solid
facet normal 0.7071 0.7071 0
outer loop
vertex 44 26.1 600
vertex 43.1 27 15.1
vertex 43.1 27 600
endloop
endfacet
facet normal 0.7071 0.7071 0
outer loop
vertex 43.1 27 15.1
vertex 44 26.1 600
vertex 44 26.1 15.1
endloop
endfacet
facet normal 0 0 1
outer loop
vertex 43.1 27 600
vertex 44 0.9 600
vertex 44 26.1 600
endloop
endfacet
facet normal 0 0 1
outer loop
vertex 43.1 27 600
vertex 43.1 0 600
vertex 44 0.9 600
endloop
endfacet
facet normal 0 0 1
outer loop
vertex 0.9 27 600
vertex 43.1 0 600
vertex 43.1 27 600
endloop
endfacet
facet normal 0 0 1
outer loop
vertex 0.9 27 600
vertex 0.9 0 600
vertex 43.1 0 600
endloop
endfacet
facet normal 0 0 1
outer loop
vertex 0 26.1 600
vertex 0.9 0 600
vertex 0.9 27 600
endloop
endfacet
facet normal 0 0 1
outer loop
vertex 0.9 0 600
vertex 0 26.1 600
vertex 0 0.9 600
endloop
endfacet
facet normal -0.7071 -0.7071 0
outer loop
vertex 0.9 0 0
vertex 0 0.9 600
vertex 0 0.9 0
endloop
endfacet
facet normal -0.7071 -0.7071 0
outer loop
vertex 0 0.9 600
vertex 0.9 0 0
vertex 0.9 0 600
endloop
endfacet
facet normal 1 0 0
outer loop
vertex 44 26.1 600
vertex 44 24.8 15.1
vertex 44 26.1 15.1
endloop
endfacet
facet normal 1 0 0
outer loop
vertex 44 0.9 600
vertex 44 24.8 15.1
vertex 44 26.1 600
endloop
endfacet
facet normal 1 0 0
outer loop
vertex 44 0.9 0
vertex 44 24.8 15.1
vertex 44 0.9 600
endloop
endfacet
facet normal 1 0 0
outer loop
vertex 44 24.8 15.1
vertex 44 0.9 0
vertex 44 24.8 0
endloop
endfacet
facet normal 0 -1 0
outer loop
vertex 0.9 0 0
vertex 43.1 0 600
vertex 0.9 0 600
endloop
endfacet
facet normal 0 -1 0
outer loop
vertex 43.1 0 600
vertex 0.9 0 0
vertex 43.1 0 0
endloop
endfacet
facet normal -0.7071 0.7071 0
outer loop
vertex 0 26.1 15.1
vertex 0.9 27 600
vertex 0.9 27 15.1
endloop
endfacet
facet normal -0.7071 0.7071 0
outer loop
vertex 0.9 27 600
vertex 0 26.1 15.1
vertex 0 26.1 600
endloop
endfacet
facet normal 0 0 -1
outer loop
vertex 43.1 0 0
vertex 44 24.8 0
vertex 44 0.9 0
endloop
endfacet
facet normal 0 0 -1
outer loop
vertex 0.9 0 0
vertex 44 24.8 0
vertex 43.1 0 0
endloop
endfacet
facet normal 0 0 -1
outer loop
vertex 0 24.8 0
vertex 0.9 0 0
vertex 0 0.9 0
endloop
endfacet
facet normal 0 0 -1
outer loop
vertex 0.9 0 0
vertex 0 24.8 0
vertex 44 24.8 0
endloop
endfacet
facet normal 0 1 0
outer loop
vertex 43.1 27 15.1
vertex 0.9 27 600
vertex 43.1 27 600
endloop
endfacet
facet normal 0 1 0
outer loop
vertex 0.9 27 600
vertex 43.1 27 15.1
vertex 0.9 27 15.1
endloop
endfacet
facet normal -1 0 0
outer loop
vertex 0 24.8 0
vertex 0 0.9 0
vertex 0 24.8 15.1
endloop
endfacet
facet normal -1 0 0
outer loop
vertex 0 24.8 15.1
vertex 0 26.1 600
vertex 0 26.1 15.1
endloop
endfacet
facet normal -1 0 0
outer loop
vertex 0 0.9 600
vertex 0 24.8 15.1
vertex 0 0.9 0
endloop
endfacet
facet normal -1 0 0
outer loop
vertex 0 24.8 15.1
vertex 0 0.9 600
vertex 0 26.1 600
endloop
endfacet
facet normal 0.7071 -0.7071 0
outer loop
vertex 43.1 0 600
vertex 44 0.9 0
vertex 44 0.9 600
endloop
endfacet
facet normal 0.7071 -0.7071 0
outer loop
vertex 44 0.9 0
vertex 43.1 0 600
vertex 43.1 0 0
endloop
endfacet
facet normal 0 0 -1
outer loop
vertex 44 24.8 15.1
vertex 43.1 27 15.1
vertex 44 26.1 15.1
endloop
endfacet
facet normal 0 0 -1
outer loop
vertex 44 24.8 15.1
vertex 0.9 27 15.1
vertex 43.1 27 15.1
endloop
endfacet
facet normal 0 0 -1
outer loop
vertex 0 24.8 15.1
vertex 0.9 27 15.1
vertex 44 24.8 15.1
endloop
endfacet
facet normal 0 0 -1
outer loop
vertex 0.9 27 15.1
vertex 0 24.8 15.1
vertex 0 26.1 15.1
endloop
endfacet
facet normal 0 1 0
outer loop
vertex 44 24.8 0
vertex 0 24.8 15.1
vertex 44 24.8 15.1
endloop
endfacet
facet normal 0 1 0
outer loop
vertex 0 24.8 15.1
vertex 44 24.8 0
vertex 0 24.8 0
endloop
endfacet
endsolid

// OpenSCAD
// file: wood_beam.scad
// Generic wooden member helpers.
// Open this file directly in OpenSCAD to tune and render a simple beam.

/* [Standalone preview] */
beam_width = 18;
beam_depth = 75;
beam_height = 300;
beam_edge_radius = 0.9;

// Wooden members get a very small visual corner radius. The radius is
// deliberately subtle: it helps separate adjoining parts in preview without
// materially changing the nominal dimensions used for the design.
module wood_beam(width, depth, height, radius = 0.9) {
    r = min(radius, min(width, depth) / 4);
    if (r <= 0)
        cube([width, depth, height]);
    else
        linear_extrude(height = height)
            offset(r = r)
                offset(delta = -r)
                    square([width, depth]);
}

// Extrude a 2D polygon drawn in the Y/Z plane through X.
module wood_prism_yz(width, points, radius = 0.9) {
    multmatrix([
        [0, 0, 1, 0],
        [1, 0, 0, 0],
        [0, 1, 0, 0],
        [0, 0, 0, 1]
    ])
        linear_extrude(height = width)
            if (radius > 0)
                offset(r = radius)
                    offset(delta = -radius)
                        polygon(points = points);
            else
                polygon(points = points);
}

module wood_arm_yz(width, rear_y, bottom_z, length, thickness, angle) {
    front_y = rear_y + length * cos(angle);
    rise    = (front_y - rear_y) * tan(angle);
    dz      = thickness / cos(angle);

    wood_prism_yz(width, [
        [rear_y,  bottom_z],
        [front_y, bottom_z + rise],
        [front_y, bottom_z + rise + dz],
        [rear_y,  bottom_z + dz]
    ]);
}

module wood_brace_to_arm_yz(
    width,
    rear_y,
    lower_z,
    thickness,
    brace_angle,
    arm_bottom_z,
    arm_angle,
    arm_rear_y = undef
) {
    ary = is_undef(arm_rear_y) ? rear_y : arm_rear_y;
    brace_dz = thickness / cos(brace_angle);
    ta = tan(arm_angle);
    tb = tan(brace_angle);

    y_low = (arm_bottom_z - ta * ary - lower_z + tb * rear_y) / (tb - ta);
    y_high = (arm_bottom_z - ta * ary - lower_z - brace_dz + tb * rear_y) / (tb - ta);

    z_low  = lower_z + tb * (y_low - rear_y);
    z_high = lower_z + brace_dz + tb * (y_high - rear_y);

    wood_prism_yz(width, [
        [rear_y, lower_z],
        [y_low,  z_low],
        [y_high, z_high],
        [rear_y, lower_z + brace_dz]
    ]);
}

// Standalone component preview/render.
wood_beam(beam_width, beam_depth, beam_height, beam_edge_radius);
// main file
use <wood_beam.scad>

// Rear wooden cross bar with a saw-cut slot for one vertical wall of the
// upward-open steel U-profile.
// Open this file directly in OpenSCAD to tune and render the part.

/* [Dimensions] */
bar_width = 44;
bar_depth = 27;
bar_height = 600;
slot_width = 2.2;
slot_depth = 15;

module mount_bar(width, depth, height, slot_width, slot_depth) {
    difference() {
        wood_beam(width, depth, height);

        translate([-1, depth - slot_width, -0.1])
            cube([width + 2, slot_width + 0.1, slot_depth + 0.2]);
    }
}

// Standalone component preview/render.
mount_bar(bar_width, bar_depth, bar_height, slot_width, slot_depth);
